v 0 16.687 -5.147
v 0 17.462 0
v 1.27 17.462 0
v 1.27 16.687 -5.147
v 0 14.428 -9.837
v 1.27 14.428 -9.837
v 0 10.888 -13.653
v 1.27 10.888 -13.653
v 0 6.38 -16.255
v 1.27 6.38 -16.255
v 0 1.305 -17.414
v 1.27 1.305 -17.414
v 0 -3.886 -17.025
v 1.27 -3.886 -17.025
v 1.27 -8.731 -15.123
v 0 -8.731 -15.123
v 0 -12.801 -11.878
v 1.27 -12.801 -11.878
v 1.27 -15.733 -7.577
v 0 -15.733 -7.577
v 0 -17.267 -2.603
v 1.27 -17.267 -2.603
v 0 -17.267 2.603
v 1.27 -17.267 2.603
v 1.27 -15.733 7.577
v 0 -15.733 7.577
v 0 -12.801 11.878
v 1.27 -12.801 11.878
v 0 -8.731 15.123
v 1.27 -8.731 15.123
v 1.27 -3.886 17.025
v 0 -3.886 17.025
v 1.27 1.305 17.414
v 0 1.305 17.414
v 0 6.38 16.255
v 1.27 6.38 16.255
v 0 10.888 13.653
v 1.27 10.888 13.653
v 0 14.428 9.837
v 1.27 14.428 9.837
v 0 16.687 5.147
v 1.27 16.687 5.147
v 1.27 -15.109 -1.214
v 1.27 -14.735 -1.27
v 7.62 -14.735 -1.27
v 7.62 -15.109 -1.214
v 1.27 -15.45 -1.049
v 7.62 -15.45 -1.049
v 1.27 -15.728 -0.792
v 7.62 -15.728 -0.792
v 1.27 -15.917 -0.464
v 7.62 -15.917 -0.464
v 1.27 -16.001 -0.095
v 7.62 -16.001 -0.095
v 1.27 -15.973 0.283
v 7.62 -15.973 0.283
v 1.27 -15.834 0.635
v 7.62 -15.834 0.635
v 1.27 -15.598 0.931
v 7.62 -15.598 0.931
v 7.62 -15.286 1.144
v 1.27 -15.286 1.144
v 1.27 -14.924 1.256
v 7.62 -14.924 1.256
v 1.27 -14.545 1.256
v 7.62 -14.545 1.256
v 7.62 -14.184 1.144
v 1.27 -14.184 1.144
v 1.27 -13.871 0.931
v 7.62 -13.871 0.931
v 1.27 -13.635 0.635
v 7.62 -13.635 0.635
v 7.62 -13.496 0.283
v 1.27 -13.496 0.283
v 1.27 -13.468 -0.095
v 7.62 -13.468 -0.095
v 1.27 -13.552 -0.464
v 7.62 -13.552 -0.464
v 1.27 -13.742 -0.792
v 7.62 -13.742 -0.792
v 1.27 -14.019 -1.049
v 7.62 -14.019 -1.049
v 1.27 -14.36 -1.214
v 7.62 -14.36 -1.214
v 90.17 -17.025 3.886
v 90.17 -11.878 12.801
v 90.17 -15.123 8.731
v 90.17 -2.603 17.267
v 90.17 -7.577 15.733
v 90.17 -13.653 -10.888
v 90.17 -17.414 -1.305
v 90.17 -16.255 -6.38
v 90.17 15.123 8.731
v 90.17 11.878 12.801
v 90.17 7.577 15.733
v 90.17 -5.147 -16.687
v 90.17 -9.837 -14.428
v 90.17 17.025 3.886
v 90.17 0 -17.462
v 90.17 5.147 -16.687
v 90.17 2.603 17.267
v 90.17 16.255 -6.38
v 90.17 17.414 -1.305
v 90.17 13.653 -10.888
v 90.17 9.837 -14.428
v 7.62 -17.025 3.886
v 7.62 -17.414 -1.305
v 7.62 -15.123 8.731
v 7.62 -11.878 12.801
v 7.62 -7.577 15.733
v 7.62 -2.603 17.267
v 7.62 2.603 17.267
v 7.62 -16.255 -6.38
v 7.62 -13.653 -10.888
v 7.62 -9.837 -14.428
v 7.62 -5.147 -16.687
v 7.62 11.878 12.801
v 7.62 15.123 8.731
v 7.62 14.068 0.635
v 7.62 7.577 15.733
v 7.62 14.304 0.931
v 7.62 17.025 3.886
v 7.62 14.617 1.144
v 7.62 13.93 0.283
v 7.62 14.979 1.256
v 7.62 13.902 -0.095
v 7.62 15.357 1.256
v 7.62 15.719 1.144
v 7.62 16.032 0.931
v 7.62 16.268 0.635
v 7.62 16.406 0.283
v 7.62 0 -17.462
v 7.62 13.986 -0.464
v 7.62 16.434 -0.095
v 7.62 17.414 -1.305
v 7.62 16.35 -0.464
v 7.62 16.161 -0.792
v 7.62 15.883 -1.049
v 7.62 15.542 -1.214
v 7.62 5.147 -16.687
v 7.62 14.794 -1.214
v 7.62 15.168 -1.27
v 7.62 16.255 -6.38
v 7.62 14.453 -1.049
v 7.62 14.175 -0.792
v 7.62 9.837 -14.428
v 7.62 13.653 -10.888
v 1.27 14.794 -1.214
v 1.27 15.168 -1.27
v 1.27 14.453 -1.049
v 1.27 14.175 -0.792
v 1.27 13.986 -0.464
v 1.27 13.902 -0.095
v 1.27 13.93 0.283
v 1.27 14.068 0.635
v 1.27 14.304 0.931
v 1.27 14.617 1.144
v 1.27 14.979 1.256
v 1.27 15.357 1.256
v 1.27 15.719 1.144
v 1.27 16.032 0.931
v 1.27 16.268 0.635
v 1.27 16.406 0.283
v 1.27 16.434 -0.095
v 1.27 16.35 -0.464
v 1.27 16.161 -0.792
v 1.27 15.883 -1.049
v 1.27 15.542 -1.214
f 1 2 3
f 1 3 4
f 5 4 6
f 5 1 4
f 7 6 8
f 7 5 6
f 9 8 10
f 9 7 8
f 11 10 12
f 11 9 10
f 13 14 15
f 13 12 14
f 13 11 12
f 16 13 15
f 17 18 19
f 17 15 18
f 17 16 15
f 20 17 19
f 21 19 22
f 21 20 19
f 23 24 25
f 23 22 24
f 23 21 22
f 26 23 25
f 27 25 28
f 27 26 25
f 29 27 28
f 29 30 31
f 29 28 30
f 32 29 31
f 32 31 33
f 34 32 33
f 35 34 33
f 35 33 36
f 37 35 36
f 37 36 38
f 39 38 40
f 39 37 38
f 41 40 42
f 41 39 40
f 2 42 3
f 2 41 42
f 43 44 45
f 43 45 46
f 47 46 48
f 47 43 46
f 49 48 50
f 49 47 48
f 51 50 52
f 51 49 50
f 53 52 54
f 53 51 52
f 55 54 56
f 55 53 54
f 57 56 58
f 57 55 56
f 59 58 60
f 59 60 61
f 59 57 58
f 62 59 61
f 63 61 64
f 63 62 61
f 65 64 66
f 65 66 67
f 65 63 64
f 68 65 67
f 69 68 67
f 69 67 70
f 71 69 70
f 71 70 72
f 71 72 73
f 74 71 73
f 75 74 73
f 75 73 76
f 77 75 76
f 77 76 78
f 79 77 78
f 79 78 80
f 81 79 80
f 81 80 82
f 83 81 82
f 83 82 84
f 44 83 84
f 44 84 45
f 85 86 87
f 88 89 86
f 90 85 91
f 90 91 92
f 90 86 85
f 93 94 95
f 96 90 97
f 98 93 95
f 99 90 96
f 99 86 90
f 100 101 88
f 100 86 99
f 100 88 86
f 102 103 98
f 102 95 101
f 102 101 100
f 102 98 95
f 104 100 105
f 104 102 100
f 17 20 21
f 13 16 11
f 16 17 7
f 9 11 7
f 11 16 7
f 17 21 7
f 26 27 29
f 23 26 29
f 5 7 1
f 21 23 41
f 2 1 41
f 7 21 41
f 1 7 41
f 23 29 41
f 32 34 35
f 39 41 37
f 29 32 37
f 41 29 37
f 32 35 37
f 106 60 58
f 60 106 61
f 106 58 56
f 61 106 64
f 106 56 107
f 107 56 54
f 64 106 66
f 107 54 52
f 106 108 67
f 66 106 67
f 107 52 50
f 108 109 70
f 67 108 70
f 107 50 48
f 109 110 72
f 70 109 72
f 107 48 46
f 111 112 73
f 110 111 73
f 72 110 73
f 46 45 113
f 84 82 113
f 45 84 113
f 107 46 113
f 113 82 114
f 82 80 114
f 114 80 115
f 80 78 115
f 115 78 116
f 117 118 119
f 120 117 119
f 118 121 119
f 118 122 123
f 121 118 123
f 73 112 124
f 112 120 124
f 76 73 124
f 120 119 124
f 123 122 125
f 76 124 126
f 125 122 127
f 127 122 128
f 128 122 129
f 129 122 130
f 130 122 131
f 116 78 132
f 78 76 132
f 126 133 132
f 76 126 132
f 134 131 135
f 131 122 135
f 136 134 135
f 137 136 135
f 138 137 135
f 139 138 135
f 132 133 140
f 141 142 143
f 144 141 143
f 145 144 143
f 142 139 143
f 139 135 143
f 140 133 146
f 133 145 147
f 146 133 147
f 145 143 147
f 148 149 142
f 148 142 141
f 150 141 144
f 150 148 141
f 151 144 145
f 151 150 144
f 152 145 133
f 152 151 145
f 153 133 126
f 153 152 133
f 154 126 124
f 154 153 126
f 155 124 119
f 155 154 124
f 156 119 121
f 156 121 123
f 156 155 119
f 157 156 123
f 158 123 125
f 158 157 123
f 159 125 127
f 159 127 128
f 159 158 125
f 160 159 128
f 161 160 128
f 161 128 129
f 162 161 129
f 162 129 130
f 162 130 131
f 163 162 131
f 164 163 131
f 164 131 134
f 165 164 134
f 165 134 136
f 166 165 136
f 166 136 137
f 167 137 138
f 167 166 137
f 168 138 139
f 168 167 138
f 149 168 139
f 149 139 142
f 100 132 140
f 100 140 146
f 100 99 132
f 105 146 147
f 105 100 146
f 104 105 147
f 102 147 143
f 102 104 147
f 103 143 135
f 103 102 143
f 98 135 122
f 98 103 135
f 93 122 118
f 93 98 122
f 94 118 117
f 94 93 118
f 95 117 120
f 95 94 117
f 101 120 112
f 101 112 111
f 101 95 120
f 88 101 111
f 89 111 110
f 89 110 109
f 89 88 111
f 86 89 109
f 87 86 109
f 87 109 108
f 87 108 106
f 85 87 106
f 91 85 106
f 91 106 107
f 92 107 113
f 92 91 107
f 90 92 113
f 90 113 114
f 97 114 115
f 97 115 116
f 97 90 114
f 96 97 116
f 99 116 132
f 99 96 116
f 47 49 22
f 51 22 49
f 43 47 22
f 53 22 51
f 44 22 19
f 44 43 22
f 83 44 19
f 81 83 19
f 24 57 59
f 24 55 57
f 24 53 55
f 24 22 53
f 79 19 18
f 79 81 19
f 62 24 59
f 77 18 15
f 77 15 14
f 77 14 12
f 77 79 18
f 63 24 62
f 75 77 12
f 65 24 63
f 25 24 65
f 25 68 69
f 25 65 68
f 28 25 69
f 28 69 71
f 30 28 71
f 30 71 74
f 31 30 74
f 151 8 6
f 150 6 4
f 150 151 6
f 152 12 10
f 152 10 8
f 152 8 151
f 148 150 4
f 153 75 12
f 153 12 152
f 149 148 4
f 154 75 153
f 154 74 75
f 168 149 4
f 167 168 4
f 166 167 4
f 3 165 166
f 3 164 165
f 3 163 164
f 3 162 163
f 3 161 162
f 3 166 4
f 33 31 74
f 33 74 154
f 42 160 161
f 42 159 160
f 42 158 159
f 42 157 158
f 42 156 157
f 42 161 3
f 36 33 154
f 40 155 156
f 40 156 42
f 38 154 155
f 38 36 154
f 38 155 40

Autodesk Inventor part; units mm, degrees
ref_plane "YZ Plane" through (0, 0, 0) normal (1, 0, 0) x (0, 1, 0)
ref_plane "XZ Plane" through (0, 0, 0) normal (0, 1, 0) x (-1, 0, 0)
ref_plane "XY Plane" through (0, 0, 0) normal (0, 0, 1) x (1, 0, 0)
sketch "Sketch1" plane through (0, 0, 0) normal (1, 0, 0) x (0, 1, 0)
  circle A0 centre (0, 0) radius 17.4625
extrude "Extrusion1" add sketch "Sketch1" along normal blind 1.27
sketch "Sketch2" plane through (1.27, 0, 0) normal (1, 0, 0) x (0, 0, -1)
  circle A0 centre (0, 15.168) radius 1.27
  circle A1 centre (0, -14.7346) radius 1.27
  point P0 (0, 0)
extrude "Extrusion2" add sketch "Sketch2" along normal blind 88.9
sketch "Sketch3" plane through (90.17, 15.168, 0) normal (1, 0, 0) x (0, 0, -1)
  circle A0 centre (0, -15.168) radius 17.4625
extrude "Extrusion3" add sketch "Sketch3" against normal blind 82.55
sketch "Sketch4" plane through (1.27, 0, 0) normal (1, 0, 0) x (0, 0, -1)
  point P0 (0, 0)
sketch "Sketch5" plane through (1.27, 0, 0) normal (1, 0, 0) x (0, 0, -1)
  point P0 (0, 0)
extrude "Extrusion4" [suppressed]
properties part number "STACK NEW." material "Glass"
